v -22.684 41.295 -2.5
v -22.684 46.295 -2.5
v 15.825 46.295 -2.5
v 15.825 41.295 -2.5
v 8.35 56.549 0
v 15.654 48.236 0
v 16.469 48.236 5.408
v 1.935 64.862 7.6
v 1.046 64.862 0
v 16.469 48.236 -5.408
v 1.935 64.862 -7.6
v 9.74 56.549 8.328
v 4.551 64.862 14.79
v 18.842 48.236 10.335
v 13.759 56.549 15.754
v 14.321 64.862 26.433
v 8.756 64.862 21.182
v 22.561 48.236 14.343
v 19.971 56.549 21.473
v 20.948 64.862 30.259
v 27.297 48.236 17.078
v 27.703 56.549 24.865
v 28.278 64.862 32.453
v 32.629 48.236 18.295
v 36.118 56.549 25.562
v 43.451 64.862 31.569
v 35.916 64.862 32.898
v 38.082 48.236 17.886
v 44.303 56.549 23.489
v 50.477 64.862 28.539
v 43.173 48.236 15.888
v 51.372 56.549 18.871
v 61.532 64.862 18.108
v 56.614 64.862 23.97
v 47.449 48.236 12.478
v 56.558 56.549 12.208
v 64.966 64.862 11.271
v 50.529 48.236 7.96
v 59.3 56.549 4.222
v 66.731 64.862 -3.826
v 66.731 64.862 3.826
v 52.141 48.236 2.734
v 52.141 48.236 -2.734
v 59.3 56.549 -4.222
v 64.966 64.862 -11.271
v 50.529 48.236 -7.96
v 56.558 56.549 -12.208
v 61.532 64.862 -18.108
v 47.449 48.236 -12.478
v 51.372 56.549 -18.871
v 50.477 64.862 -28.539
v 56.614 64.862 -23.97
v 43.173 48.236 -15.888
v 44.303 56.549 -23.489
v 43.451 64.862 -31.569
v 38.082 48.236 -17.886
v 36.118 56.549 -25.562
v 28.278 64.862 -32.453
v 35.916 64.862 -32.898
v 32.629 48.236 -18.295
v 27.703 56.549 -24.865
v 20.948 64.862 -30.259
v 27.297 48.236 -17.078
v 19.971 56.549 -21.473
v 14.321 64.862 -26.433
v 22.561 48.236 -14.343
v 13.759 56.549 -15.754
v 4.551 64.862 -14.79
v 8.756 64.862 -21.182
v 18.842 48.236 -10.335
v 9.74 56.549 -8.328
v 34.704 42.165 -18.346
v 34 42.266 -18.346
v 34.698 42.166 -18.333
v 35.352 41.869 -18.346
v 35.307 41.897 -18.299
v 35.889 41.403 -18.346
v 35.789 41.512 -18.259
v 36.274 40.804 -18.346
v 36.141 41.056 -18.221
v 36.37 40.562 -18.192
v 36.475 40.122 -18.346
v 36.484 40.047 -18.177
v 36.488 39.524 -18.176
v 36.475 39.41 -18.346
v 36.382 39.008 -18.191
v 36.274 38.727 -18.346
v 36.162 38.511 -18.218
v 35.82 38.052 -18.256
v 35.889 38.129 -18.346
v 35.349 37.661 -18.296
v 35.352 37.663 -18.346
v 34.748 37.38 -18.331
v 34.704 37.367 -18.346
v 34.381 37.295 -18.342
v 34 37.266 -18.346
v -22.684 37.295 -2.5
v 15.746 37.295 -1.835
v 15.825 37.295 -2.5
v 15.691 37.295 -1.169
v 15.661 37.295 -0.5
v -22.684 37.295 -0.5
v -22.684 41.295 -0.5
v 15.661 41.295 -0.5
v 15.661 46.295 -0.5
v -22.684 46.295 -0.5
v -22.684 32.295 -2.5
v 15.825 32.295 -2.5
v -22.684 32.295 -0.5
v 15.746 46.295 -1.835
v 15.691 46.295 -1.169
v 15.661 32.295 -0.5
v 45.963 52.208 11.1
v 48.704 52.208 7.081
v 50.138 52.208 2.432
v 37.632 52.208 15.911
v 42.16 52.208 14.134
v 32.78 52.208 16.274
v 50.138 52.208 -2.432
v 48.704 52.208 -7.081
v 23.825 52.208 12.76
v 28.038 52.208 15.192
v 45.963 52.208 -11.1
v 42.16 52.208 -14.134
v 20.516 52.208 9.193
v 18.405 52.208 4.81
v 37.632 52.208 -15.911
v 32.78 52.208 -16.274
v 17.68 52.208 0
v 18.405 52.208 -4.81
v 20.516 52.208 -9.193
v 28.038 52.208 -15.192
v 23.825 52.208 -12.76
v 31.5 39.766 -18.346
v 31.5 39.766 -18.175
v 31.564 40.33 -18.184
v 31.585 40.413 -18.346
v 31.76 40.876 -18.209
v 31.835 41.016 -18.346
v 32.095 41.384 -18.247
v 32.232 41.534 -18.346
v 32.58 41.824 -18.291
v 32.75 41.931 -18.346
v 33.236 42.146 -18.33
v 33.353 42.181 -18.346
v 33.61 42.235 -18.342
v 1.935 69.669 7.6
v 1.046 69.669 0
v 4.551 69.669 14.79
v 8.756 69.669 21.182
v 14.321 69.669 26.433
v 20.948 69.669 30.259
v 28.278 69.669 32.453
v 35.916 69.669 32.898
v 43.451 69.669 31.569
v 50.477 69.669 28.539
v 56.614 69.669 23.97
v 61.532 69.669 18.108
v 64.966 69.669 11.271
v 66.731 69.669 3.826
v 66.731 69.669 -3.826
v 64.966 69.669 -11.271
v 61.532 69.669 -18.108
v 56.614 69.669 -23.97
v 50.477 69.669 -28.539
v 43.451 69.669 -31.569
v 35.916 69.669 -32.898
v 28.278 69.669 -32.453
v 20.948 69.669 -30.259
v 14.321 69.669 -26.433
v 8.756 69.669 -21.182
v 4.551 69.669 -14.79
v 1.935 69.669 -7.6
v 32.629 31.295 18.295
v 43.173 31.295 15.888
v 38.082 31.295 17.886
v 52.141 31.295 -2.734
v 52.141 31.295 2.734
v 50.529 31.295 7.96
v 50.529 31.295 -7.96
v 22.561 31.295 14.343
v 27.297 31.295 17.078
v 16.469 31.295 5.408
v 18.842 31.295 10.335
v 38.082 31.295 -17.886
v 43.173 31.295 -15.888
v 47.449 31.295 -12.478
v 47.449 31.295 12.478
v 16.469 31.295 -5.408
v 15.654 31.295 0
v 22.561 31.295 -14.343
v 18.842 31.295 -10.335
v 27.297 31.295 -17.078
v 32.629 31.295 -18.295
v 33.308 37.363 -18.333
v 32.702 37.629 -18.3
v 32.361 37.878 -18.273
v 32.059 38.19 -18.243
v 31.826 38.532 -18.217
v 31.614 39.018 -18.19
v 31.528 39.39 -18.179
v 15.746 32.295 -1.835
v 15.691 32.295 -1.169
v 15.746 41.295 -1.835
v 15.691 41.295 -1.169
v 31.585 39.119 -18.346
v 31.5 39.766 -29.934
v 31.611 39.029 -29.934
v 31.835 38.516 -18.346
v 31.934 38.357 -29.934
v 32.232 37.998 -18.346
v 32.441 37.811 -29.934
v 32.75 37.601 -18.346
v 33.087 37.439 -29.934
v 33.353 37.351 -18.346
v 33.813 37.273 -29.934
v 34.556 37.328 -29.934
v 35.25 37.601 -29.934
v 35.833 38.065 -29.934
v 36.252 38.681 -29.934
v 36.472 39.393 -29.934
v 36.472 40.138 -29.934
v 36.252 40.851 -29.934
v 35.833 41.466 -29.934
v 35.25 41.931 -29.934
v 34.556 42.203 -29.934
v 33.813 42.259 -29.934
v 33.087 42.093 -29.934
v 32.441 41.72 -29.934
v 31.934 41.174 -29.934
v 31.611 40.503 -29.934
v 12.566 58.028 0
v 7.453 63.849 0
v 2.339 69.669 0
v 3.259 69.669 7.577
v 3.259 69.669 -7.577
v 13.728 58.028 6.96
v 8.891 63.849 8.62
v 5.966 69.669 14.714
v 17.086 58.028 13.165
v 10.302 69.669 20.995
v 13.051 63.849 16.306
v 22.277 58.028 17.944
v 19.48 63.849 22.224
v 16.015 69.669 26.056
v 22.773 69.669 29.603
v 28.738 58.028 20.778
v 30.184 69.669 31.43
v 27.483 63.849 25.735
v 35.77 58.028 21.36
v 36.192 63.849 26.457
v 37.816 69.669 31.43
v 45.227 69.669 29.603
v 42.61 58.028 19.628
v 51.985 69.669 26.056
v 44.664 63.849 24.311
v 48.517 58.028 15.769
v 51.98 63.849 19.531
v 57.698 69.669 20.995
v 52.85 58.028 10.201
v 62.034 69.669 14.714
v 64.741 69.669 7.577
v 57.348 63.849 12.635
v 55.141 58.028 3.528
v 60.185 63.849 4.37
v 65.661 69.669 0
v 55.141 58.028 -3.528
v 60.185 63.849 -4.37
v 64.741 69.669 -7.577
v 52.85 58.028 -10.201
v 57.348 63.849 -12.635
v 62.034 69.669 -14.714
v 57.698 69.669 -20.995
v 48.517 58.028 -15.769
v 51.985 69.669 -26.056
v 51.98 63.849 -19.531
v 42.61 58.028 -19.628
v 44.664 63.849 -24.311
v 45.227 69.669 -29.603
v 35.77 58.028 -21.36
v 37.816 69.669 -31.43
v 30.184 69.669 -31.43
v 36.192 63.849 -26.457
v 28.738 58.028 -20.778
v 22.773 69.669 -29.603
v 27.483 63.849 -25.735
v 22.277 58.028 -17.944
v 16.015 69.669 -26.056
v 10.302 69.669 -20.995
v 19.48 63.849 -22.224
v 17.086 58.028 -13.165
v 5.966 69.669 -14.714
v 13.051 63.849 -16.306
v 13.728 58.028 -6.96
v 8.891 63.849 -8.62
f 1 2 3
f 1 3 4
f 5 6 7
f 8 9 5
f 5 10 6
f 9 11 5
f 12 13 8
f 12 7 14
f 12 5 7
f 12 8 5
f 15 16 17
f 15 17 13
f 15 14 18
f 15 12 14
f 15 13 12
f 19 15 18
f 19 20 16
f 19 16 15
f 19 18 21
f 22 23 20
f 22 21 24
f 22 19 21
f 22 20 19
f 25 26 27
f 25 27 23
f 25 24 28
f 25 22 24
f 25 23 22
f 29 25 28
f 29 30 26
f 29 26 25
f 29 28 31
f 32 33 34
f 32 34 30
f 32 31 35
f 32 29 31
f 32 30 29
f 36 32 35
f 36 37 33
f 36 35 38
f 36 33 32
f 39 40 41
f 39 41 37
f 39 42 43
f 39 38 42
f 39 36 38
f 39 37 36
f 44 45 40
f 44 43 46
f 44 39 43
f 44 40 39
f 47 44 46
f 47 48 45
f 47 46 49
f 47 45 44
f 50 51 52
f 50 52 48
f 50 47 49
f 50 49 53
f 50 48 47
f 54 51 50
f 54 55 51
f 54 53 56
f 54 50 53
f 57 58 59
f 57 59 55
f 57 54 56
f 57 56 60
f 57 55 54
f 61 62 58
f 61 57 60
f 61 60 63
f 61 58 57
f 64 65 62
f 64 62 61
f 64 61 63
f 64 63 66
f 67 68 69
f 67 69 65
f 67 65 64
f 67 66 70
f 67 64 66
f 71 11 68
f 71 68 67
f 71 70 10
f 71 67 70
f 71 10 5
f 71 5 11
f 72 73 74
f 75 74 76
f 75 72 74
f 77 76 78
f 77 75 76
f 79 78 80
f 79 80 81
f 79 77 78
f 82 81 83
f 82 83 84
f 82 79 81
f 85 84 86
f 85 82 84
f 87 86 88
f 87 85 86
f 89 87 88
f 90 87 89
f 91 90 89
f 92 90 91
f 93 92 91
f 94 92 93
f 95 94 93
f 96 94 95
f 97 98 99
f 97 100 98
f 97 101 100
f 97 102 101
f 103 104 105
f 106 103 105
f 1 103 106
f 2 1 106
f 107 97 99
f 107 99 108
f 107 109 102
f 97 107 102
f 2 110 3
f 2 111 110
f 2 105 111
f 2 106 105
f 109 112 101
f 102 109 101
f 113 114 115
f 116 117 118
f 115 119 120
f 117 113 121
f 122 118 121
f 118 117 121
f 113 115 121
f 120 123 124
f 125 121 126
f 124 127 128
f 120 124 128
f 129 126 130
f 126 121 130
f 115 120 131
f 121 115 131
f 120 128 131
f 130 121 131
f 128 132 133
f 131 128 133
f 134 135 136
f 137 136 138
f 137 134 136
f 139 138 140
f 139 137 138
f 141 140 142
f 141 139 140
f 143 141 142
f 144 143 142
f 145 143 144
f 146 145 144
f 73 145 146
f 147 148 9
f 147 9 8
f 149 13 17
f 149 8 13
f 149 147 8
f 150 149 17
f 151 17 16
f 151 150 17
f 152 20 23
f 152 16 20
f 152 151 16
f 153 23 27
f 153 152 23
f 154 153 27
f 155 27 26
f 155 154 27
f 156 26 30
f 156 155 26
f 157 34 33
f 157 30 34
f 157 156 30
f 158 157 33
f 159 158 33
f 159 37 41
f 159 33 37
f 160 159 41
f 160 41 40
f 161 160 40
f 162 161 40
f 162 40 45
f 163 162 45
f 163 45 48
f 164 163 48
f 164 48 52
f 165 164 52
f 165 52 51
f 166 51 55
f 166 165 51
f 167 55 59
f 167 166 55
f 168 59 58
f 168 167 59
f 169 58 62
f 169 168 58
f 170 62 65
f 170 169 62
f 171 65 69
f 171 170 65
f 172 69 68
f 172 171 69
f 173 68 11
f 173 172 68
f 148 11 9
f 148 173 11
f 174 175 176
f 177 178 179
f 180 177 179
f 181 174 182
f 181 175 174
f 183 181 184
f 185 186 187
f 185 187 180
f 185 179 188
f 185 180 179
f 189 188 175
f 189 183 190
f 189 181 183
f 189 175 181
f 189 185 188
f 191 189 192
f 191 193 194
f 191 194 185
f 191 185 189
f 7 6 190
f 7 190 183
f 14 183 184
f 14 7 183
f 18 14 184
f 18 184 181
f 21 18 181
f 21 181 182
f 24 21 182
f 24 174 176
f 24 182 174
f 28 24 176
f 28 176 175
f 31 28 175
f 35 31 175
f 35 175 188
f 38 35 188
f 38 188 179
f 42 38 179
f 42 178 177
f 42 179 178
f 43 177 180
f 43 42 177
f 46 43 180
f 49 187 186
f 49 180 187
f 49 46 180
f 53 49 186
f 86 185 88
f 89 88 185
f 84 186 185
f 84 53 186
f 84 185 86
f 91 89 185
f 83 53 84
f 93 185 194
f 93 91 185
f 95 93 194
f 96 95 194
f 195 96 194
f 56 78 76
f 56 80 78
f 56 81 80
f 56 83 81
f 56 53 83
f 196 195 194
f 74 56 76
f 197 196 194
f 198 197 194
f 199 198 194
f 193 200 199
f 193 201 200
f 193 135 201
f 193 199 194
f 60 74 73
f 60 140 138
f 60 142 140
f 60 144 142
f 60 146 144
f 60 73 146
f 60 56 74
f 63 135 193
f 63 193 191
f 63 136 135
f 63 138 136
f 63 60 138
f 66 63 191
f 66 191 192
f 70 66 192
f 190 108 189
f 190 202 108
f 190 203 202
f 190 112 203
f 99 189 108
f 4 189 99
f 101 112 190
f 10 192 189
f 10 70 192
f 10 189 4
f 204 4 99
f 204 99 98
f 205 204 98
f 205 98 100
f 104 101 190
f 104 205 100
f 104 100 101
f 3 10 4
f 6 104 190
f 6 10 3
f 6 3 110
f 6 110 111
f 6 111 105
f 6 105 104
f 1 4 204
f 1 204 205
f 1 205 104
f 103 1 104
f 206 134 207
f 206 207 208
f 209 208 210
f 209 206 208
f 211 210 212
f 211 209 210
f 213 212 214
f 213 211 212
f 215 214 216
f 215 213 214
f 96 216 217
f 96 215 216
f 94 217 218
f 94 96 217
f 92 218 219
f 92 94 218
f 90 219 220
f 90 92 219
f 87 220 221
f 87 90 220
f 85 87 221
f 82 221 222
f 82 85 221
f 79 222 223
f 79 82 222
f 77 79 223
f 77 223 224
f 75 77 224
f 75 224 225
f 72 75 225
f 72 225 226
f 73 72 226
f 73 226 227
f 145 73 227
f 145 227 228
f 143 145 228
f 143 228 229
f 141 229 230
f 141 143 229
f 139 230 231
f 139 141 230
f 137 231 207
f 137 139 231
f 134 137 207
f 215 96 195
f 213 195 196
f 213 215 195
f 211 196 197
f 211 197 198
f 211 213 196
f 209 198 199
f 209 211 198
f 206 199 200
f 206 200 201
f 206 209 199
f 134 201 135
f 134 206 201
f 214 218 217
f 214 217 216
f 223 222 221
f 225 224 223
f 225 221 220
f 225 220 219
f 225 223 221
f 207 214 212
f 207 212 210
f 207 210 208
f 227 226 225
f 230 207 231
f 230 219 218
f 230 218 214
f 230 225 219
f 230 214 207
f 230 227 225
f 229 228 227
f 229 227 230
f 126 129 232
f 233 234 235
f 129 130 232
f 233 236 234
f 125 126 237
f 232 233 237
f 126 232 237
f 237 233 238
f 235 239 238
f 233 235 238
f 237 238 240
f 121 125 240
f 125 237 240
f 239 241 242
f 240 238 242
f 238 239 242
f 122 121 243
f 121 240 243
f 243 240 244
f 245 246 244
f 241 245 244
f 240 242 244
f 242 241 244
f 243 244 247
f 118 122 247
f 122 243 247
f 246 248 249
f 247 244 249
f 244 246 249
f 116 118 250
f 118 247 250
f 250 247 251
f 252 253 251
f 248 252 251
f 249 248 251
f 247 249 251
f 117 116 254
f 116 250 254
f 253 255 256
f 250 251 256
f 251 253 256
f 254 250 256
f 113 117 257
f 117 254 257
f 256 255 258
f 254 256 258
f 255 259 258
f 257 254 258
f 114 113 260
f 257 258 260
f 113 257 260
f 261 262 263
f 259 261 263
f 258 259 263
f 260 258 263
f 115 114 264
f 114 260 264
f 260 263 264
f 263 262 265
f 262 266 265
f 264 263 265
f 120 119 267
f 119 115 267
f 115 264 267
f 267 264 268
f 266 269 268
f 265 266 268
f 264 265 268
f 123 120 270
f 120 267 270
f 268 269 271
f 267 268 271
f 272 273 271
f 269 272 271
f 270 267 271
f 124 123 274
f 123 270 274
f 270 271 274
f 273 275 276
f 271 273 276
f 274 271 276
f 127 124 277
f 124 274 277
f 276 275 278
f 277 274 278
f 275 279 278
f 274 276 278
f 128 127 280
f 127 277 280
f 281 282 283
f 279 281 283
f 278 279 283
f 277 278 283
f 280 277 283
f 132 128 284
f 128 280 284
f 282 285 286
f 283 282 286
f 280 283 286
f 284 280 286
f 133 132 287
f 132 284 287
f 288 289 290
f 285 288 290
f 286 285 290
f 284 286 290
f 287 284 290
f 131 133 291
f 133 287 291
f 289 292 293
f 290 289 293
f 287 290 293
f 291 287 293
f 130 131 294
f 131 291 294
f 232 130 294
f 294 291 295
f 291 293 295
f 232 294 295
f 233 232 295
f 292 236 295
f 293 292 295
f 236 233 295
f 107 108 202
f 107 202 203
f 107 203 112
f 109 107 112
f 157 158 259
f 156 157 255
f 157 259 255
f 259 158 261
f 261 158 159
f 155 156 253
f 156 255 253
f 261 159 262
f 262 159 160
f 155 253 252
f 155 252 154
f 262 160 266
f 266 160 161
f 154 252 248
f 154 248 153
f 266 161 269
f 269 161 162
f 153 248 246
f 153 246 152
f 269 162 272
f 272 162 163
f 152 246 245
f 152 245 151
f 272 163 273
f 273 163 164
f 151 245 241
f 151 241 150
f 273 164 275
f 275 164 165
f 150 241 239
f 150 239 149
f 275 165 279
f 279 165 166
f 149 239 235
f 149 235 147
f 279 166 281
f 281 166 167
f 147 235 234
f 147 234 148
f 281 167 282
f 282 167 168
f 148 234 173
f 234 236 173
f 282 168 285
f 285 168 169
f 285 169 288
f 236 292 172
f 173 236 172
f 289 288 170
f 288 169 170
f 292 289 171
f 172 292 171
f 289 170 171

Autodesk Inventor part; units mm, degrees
ref_plane "XZ Plane" through (0, 0, 0) normal (0, 1, 0) x (-1, 0, 0)
ref_plane "XY Plane" through (0, 0, 0) normal (0, 0, 1) x (1, 0, 0)
sketch "Sketch1" plane through (0, 0, 0) normal (0, 0, 1) x (1, 0, 0)
  line L0 (34, 31.2954) -> (15.654, 31.2954)
  line L1 (15.654, 31.2954) -> (15.654, 48.2362)
  line L2 (15.654, 48.2362) -> (1.0463, 64.8622)
  line L3 (1.0463, 64.8622) -> (1.0463, 69.6686)
  line L4 (1.0463, 69.6686) -> (2.3392, 69.6686)
  line L5 (2.3392, 69.6686) -> (17.6799, 52.2084)
  line L6 (17.6799, 52.2084) -> (34, 52.2084)
  line L7 (52, 820) -> (16, 820) projected
  line L8 (34, 820) -> (34, 0)
  point P0 (0, 0)
revolve "Revolution1" add sketch "Sketch1" angle 360 about axis through (34, 820, 0) along (0, -1, 0)
ref_plane "Work Plane1" through (15.654, 39.7658, 0) normal (1, 0, 0) x (0, 1, 0)
sketch "Sketch2" plane through (15.654, 39.7658, 0) normal (1, 0, 0) x (0, 1, 0)
  line L0 (-8.4704, -18.346) -> (-8.4704, 18.346) construction
  line L1 (-2.4704, -2.5) -> (-7.4704, -2.5)
  line L2 (-7.4704, -2.5) -> (-7.4704, -0.5)
  line L3 (-7.4704, -0.5) -> (-2.4704, -0.5)
  line L4 (-2.4704, -0.5) -> (-2.4704, -2.5)
  line L5 (6.5296, -2.5) -> (1.5296, -2.5)
  line L6 (1.5296, -2.5) -> (1.5296, -0.5)
  line L7 (1.5296, -0.5) -> (6.5296, -0.5)
  line L8 (6.5296, -0.5) -> (6.5296, -2.5)
  line L9 (6.5296, -2.5) -> (1.5296, -0.5) construction
  line L10 (6.5296, -0.5) -> (1.5296, -2.5) construction
  line L11 (-7.4704, -0.5) -> (-2.4704, -2.5) construction
  line L12 (-7.4704, -2.5) -> (-2.4704, -0.5) construction
  line L13 (-39.7658, 0) -> (810.2342, 0) projected
  dimension "d1" = 5
  dimension "d2" = 2
  dimension "d3" = 1
  dimension "d4" = 4
  dimension "d10" = 0.5
extrude "Extrusion1" add sketch "Sketch2" along normal blind 2.0625 and the other way blind 38.3375
ref_plane "Work Plane3" through (34, 39.7658, -18.346) normal (0, 0, -1) x (-1, 0, 0)
ref_plane "Work Plane2" through (-80, 0, -3) normal (0, 0, -1) x (-1, 0, 0)
sketch "Sketch3" plane through (34, 39.7658, -18.346) normal (0, 0, -1) x (-1, 0, 0)
  circle A0 centre (0, 0) radius 2.5
  circle A1 centre (0, 779.9029) radius 2.5 projected
  point P0 (34, -39.7658)
extrude "Extrusion2" add sketch "Sketch3" along normal blind 11.5875 and the other way blind 5.7935 contours A0
properties part number "BallReciever"
